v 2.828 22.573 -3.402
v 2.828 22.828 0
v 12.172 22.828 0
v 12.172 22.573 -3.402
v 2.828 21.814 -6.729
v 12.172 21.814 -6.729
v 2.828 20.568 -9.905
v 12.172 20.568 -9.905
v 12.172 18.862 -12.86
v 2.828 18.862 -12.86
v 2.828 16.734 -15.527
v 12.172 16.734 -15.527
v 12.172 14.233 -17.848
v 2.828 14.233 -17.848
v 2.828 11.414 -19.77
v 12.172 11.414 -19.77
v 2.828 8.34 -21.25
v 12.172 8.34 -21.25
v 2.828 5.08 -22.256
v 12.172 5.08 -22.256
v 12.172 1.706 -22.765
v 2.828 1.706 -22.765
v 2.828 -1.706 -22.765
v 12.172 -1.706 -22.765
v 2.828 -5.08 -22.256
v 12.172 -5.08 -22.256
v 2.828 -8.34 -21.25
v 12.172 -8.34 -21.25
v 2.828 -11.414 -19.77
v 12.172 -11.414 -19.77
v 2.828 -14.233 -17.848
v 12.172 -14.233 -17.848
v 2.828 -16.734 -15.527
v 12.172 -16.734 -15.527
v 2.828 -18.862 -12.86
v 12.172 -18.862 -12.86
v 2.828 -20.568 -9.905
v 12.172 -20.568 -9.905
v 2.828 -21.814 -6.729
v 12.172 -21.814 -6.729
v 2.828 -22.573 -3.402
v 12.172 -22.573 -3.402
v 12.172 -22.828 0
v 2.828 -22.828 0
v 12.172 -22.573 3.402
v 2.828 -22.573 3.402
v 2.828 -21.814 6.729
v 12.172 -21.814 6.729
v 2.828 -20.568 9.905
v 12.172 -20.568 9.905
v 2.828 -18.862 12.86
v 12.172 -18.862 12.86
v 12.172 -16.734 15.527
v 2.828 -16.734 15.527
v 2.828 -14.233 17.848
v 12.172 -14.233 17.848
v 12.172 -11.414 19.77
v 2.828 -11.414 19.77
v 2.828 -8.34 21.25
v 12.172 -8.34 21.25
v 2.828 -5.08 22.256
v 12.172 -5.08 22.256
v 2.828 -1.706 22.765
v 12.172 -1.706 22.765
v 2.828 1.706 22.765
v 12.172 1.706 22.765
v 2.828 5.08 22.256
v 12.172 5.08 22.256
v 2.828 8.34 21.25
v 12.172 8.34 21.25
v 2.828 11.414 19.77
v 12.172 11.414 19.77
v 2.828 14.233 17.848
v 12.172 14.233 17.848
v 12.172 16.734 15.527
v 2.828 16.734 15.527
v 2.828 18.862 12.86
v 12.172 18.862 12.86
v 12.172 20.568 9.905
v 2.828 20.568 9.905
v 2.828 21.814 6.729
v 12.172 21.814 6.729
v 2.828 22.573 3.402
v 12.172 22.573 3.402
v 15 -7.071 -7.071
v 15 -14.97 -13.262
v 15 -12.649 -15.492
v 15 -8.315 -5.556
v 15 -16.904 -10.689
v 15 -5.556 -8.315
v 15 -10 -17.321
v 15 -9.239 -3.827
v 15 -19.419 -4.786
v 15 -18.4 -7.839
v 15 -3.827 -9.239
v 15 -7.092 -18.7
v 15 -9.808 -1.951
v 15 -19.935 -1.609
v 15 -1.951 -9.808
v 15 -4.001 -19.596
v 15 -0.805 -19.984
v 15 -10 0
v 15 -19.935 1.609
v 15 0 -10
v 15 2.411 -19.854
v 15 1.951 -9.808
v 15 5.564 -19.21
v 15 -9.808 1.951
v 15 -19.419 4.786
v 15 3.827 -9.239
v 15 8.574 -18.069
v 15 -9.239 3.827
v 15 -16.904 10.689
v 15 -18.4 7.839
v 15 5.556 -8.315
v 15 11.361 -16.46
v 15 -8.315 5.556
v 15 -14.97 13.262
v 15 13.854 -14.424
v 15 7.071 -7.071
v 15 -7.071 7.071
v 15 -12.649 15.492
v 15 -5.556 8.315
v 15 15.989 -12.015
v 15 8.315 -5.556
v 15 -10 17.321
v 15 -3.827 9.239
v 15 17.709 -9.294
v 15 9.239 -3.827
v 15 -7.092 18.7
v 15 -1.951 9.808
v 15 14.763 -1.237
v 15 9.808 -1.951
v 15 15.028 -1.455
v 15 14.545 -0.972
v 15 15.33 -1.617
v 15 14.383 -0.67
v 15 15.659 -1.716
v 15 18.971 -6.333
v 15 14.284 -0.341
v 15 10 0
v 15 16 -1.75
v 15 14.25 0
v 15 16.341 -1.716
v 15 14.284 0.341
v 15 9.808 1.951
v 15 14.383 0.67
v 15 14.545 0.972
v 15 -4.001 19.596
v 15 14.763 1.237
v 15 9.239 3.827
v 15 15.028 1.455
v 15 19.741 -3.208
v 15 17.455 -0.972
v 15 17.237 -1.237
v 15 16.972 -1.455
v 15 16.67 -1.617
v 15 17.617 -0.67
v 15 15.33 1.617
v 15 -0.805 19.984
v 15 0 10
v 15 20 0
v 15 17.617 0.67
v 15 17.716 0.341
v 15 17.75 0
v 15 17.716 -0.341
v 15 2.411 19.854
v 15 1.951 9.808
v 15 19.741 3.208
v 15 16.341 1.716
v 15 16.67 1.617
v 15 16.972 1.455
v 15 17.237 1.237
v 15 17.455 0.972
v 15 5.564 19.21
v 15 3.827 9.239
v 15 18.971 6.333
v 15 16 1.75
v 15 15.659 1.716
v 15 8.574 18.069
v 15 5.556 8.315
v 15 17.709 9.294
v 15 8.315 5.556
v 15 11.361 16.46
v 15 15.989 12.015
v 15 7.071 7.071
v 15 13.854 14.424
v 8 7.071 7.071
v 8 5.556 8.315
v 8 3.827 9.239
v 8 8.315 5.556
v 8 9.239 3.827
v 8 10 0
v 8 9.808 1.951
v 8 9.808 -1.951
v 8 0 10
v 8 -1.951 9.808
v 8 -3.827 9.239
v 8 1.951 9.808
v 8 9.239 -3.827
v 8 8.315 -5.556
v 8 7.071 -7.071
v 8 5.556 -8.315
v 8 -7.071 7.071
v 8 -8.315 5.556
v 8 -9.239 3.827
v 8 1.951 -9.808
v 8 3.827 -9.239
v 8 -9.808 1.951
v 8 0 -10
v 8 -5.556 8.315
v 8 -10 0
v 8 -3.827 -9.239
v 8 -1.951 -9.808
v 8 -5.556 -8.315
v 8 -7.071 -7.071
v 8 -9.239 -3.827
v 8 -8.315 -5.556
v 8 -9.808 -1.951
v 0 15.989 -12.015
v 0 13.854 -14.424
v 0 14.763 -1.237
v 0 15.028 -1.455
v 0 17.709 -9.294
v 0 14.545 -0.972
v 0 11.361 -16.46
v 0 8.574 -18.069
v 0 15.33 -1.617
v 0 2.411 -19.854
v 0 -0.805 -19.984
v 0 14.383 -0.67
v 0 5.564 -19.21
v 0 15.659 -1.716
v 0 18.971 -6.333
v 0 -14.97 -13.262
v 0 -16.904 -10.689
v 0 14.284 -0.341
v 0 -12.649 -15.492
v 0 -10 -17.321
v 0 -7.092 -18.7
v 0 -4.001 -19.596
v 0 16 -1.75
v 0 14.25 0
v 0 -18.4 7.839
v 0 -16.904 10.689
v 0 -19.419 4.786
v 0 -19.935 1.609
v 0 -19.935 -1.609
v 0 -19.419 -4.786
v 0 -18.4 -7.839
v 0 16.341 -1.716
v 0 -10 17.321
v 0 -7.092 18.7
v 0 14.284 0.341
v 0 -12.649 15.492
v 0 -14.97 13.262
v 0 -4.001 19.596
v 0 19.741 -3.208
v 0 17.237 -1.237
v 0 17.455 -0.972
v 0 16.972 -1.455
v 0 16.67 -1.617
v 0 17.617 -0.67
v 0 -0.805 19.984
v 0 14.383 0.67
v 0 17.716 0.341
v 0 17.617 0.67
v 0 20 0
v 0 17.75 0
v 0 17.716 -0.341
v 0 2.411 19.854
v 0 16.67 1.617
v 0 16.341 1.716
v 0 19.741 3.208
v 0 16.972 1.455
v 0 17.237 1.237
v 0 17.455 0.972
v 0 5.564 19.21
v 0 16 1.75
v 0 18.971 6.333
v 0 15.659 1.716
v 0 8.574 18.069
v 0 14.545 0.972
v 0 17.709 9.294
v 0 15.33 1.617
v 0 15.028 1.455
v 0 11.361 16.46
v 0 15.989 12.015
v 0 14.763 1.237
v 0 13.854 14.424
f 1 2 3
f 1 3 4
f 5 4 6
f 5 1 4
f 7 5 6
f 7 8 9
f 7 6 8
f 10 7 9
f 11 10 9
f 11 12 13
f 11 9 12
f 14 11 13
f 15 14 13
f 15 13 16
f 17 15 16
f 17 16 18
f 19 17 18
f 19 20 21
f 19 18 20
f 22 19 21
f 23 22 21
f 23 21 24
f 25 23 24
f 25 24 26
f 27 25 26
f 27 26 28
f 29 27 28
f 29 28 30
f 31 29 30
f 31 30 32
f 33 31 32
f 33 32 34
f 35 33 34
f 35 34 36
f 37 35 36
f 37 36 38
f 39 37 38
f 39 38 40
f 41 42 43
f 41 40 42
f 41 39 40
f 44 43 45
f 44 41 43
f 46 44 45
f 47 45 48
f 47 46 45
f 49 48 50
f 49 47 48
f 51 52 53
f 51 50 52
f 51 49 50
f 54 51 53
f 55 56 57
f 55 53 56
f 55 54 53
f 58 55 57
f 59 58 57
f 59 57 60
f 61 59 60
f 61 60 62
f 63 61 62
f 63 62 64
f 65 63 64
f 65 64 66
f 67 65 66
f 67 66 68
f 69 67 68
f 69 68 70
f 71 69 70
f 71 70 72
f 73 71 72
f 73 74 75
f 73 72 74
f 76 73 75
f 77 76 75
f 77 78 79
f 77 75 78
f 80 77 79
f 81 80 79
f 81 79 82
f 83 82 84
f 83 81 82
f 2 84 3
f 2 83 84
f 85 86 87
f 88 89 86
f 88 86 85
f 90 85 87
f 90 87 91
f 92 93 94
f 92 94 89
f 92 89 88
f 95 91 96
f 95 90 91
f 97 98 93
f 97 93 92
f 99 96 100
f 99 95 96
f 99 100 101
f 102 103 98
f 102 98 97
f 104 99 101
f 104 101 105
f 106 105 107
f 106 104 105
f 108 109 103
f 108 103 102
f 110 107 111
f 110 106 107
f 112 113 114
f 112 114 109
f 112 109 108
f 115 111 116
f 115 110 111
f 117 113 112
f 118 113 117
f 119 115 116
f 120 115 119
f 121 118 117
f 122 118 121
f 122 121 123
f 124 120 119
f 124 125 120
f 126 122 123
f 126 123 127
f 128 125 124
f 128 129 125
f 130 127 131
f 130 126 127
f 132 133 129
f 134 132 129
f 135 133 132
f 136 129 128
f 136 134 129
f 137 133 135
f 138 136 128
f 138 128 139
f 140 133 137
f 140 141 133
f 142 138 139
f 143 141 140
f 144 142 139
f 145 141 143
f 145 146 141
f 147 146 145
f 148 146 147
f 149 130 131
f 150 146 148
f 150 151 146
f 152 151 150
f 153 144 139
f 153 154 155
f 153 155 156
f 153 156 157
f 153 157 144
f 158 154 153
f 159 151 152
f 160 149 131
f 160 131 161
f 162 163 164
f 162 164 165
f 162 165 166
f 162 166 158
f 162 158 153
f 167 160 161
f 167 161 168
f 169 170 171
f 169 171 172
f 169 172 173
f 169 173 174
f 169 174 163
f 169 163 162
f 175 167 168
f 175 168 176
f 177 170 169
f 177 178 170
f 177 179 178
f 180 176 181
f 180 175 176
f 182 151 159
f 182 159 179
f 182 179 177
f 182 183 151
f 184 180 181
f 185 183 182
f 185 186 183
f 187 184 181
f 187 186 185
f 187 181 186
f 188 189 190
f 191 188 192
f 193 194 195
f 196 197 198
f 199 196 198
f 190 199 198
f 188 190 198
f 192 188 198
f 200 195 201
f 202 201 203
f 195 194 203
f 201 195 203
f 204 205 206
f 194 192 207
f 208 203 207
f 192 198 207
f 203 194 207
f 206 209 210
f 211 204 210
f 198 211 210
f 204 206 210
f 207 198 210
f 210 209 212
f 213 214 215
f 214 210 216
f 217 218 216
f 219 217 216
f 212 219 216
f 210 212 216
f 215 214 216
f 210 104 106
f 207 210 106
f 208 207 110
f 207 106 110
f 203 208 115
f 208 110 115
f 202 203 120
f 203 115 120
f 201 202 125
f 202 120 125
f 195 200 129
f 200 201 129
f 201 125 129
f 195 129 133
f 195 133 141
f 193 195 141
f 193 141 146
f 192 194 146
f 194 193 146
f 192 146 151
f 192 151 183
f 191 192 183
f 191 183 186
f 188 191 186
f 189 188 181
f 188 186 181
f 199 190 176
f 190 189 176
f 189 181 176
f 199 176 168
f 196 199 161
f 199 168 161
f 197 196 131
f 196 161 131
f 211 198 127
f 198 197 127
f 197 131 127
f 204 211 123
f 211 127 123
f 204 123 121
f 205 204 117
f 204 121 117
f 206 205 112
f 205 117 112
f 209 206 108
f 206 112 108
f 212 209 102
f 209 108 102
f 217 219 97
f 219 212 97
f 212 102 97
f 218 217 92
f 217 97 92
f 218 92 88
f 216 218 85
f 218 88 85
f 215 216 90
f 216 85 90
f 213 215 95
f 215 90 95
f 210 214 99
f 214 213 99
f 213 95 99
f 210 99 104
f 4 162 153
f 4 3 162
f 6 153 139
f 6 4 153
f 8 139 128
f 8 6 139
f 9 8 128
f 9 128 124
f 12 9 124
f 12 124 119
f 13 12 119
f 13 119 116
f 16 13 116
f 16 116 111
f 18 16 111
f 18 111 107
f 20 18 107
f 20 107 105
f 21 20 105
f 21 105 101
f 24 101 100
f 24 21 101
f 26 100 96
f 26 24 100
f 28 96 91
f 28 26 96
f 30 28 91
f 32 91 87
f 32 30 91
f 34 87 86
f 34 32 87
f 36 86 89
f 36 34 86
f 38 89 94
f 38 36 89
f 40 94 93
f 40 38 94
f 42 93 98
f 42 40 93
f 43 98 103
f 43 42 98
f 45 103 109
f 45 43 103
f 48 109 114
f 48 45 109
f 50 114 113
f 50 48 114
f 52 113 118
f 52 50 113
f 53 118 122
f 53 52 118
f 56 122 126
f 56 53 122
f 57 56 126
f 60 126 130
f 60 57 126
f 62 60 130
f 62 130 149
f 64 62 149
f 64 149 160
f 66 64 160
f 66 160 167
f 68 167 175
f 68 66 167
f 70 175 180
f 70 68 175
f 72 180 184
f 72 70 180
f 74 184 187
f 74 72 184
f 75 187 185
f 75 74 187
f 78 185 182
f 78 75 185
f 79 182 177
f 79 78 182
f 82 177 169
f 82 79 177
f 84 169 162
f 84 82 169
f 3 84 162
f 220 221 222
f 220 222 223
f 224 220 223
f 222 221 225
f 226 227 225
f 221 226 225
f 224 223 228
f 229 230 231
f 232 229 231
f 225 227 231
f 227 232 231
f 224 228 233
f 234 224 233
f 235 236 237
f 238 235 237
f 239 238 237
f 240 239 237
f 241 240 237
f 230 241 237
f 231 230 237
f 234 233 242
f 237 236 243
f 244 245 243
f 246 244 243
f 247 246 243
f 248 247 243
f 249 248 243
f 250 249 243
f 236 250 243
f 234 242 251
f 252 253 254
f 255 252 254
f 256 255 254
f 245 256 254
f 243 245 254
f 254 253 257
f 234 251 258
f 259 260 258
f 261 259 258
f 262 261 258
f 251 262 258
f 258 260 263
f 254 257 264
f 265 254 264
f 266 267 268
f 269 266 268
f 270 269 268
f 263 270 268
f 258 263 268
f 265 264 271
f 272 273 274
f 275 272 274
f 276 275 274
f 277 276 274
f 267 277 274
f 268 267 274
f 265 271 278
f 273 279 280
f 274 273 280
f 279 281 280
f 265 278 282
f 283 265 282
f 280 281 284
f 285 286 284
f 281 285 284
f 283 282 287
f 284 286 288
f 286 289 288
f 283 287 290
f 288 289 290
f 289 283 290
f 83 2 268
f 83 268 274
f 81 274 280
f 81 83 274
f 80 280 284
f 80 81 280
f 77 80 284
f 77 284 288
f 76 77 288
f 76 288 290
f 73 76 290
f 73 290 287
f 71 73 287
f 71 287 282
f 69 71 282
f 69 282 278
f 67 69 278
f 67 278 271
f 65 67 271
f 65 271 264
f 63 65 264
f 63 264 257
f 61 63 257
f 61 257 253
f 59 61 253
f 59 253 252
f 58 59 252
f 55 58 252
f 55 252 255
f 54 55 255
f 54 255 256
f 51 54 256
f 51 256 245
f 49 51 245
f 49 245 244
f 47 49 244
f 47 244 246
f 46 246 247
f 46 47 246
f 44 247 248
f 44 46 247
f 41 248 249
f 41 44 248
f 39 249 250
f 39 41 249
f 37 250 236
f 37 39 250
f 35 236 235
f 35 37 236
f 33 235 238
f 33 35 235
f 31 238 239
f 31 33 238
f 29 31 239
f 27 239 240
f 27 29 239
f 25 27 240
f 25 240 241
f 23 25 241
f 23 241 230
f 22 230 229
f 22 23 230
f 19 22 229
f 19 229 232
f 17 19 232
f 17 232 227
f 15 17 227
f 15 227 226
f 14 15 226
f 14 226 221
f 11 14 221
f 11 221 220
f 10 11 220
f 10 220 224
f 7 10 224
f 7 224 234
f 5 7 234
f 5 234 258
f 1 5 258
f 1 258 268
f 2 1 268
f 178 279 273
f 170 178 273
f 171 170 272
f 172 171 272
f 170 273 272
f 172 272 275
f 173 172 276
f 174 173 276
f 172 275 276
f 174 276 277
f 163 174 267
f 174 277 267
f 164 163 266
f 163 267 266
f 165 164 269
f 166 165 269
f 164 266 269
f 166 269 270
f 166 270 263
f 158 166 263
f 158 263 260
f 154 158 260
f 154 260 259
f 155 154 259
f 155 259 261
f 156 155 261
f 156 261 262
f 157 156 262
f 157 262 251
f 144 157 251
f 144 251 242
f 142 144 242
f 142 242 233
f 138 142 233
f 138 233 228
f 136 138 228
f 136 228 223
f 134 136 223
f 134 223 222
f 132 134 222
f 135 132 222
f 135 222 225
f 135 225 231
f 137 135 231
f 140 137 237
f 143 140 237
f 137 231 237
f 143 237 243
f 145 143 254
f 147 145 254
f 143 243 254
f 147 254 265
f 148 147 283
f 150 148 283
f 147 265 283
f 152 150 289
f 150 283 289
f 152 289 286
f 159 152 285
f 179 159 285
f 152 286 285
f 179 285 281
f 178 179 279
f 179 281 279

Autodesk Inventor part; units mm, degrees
ref_plane "YZ Plane" through (0, 0, 0) normal (1, 0, 0) x (0, 1, 0)
ref_plane "XZ Plane" through (0, 0, 0) normal (0, 1, 0) x (-1, 0, 0)
ref_plane "XY Plane" through (0, 0, 0) normal (0, 0, 1) x (1, 0, 0)
sketch "Эскиз1" plane through (0, 0, 0) normal (0, 0, 1) x (1, 0, 0)
  line L0 (0, 0) -> (0, 20)
  line L1 (0, 20) -> (2.8284, 22.8284)
  line L2 (0, 0) -> (15, 0)
  line L3 (15, 0) -> (15, 20)
  line L4 (15, 20) -> (12.1716, 22.8284)
  line L5 (12.1716, 22.8284) -> (2.8284, 22.8284)
  dimension "d0" = 20
  dimension "d1" = 4
  dimension "d2" = 135
  dimension "d3" = 15
  dimension "d4" = 4
  dimension "d5" = 135
revolve "Вращение1" add sketch "Эскиз1" angle 360 about axis through (0, 0, 0) along (1, 0, 0)
sketch "Эскиз2" plane through (0, 0, 0) normal (-1, 0, 0) x (0, 0, 1)
  circle A0 centre (0, 16) radius 1.75
  point P0 (0, 0)
  dimension "d7" = 3.5
  dimension "d8" = 16
extrude "Выдавливание1" cut sketch "Эскиз2" against normal blind 15
sketch "Эскиз3" plane through (0, 0, 0) normal (0, 1, 0) x (-1, 0, 0)
  line L0 (-15, 20) -> (-15, -20) construction
  line L1 (-15, 0) -> (-8, 0)
  line L2 (-8, 0) -> (-8, -10)
  line L3 (-8, -10) -> (-15, -10)
  line L4 (-15, -10) -> (-15, 0)
  point P0 (0, 0)
  dimension "d11" = 7
  dimension "d12" = 10
revolve "Вращение2" cut sketch "Эскиз3" angle 360 about axis through (15, 0, 0) along (-1, 0, 0)
properties part number "711122"
